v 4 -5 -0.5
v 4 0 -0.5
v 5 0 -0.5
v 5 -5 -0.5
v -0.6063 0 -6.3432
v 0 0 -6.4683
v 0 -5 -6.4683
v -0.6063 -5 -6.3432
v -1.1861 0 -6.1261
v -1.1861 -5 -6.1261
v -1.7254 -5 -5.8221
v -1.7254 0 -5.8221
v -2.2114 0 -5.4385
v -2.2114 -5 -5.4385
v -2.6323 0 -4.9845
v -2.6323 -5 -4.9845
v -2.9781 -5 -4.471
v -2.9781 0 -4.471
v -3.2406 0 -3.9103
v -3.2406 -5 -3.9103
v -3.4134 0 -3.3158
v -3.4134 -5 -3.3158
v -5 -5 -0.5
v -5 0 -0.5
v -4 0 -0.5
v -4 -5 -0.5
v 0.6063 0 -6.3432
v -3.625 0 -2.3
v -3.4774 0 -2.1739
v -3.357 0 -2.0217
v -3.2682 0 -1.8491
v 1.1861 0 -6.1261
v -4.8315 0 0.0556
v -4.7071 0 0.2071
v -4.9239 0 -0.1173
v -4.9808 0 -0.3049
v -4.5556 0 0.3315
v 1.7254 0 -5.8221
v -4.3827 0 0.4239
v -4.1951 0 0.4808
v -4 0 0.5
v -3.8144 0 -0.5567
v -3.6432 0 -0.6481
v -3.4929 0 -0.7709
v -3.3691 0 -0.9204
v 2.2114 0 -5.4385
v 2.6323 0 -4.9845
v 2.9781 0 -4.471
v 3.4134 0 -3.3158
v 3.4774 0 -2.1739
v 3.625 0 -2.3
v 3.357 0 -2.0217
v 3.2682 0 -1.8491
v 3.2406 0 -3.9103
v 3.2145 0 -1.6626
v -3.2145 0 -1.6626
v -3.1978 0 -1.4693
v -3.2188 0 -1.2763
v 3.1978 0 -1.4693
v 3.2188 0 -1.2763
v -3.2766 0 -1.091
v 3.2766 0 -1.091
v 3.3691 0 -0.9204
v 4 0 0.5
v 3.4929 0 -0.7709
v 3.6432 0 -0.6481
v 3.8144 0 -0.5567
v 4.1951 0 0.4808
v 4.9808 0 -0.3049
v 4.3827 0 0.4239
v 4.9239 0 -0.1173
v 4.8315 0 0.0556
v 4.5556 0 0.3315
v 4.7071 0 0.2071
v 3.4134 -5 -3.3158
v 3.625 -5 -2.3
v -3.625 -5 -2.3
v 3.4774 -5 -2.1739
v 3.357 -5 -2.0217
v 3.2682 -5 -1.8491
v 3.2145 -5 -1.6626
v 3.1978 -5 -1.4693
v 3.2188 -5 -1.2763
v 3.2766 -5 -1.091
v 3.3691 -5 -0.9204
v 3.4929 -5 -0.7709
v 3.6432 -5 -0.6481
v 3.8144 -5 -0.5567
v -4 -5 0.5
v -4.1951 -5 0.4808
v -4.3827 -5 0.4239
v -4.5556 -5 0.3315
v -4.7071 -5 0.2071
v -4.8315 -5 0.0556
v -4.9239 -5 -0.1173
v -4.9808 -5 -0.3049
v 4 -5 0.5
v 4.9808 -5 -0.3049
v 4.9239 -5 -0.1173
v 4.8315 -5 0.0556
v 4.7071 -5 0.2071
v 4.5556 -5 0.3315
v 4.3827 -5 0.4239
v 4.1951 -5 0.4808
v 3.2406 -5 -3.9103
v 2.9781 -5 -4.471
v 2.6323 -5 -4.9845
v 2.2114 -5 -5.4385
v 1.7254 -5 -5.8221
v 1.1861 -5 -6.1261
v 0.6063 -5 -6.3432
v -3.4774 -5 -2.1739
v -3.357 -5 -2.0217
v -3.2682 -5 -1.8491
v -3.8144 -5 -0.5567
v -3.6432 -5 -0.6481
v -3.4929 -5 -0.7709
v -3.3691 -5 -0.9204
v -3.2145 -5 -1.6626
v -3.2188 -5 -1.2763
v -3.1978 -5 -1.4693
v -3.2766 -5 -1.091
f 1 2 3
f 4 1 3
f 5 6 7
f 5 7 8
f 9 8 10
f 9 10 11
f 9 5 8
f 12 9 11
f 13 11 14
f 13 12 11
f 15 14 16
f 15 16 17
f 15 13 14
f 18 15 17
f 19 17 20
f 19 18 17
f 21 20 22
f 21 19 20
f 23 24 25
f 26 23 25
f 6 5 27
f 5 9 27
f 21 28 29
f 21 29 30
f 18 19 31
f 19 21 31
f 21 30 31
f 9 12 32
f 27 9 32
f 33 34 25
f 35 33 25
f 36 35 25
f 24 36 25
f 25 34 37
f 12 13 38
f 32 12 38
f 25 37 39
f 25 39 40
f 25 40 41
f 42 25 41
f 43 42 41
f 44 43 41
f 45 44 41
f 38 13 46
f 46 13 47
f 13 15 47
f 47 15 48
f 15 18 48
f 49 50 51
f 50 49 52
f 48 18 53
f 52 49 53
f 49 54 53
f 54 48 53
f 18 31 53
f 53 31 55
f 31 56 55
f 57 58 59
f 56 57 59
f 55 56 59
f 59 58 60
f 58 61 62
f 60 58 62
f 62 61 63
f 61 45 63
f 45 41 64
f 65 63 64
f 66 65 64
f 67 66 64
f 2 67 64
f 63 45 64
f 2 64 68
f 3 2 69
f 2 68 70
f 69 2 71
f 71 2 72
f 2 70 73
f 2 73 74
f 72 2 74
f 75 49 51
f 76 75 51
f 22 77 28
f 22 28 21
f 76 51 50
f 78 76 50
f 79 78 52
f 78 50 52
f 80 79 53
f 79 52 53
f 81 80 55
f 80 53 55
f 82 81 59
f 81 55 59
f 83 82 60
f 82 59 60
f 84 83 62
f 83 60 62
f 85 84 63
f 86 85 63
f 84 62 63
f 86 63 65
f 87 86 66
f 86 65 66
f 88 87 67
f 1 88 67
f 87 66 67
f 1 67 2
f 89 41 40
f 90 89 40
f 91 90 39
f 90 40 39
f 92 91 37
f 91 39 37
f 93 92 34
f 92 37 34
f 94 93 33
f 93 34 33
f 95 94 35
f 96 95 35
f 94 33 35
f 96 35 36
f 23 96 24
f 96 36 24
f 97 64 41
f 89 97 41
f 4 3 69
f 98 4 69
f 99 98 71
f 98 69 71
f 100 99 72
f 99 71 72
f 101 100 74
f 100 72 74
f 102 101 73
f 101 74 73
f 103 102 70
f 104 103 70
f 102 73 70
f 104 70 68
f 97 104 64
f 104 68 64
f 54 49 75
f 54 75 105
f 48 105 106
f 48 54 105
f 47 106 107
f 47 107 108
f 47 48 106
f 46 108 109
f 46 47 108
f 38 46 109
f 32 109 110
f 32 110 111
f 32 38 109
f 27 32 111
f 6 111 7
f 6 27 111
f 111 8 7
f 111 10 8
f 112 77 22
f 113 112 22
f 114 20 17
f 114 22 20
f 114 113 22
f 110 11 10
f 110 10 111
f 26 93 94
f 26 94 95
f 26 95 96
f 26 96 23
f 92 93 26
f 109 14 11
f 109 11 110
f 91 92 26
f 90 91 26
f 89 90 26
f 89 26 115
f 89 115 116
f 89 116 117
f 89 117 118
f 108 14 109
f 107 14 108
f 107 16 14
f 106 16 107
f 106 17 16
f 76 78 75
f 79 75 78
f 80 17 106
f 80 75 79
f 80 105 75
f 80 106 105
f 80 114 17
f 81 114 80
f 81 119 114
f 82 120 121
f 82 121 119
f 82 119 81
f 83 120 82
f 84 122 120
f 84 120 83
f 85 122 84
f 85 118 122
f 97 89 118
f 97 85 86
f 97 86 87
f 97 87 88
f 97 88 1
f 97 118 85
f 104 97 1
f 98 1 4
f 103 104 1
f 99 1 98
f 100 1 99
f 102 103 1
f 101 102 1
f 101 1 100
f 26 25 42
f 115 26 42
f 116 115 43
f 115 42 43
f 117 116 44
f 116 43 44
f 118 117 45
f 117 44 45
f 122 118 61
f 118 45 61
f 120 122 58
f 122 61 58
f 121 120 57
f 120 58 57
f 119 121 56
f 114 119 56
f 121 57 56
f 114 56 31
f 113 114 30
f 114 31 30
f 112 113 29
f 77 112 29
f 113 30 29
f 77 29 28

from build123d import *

# Parameters (mm, degrees)
F1_DEPTH    = 5
F2_T1_DEPTH = 21.2627511202


# Not quite as in the source:
# - a fillet or chamfer that OpenCascade refuses, or shapes differently, is made with other operations: its cross-section is extruded or revolved along the edge and cut away or added


with BuildPart() as f1:
    # F0 (on Front) → F1 (new body)
    with BuildSketch(Plane.XZ):
        with BuildLine():
            Line((4, -0.5), (5, -0.5))
            ThreePointArc((5, -0.5), (4.7071067812, 0.2071067812), (4, 0.5))
            Line((4, 0.5), (-4, 0.5))
            ThreePointArc((-4, 0.5), (-4.7071067812, 0.2071067812), (-5, -0.5))
            Line((-5, -0.5), (-4, -0.5))
            ThreePointArc((-4, -0.5), (-3.2187502413, -1.2763021336), (-3.625, -2.3))
            Line((-3.625, -2.3), (-2.75, -6.5))
            Line((-2.75, -6.5), (0, -6.5))
            Line((0, -6.5), (2.75, -6.5))
            Line((2.75, -6.5), (3.625, -2.3))
            ThreePointArc((3.625, -2.3), (3.2187502413, -1.2763021336), (4, -0.5))
        make_face()
    extrude(amount=F1_DEPTH)

    # F2: fillet of radius 4 on 2 edges, made by hand

    # F2_s2 → F2_t1 (cut)
    with BuildSketch(Plane.XZ.offset(-8.1313755601)):
        with BuildLine():
            ThreePointArc((0.502550224, -6.5), (-2.0210119343, -5.6034873985), (-3.4133714549, -3.3158170164))
            Line((-3.4133714549, -3.3158170164), (-2.75, -6.5))
            Line((-2.75, -6.5), (0.502550224, -6.5))
        make_face()
        with BuildLine():
            ThreePointArc((3.4133714549, -3.3158170164), (2.0210119343, -5.6034873985), (-0.502550224, -6.5))
            Line((-0.502550224, -6.5), (2.75, -6.5))
            Line((2.75, -6.5), (3.4133714549, -3.3158170164))
        make_face()
    extrude(amount=F2_T1_DEPTH, mode=Mode.SUBTRACT)


solid = f1.part
